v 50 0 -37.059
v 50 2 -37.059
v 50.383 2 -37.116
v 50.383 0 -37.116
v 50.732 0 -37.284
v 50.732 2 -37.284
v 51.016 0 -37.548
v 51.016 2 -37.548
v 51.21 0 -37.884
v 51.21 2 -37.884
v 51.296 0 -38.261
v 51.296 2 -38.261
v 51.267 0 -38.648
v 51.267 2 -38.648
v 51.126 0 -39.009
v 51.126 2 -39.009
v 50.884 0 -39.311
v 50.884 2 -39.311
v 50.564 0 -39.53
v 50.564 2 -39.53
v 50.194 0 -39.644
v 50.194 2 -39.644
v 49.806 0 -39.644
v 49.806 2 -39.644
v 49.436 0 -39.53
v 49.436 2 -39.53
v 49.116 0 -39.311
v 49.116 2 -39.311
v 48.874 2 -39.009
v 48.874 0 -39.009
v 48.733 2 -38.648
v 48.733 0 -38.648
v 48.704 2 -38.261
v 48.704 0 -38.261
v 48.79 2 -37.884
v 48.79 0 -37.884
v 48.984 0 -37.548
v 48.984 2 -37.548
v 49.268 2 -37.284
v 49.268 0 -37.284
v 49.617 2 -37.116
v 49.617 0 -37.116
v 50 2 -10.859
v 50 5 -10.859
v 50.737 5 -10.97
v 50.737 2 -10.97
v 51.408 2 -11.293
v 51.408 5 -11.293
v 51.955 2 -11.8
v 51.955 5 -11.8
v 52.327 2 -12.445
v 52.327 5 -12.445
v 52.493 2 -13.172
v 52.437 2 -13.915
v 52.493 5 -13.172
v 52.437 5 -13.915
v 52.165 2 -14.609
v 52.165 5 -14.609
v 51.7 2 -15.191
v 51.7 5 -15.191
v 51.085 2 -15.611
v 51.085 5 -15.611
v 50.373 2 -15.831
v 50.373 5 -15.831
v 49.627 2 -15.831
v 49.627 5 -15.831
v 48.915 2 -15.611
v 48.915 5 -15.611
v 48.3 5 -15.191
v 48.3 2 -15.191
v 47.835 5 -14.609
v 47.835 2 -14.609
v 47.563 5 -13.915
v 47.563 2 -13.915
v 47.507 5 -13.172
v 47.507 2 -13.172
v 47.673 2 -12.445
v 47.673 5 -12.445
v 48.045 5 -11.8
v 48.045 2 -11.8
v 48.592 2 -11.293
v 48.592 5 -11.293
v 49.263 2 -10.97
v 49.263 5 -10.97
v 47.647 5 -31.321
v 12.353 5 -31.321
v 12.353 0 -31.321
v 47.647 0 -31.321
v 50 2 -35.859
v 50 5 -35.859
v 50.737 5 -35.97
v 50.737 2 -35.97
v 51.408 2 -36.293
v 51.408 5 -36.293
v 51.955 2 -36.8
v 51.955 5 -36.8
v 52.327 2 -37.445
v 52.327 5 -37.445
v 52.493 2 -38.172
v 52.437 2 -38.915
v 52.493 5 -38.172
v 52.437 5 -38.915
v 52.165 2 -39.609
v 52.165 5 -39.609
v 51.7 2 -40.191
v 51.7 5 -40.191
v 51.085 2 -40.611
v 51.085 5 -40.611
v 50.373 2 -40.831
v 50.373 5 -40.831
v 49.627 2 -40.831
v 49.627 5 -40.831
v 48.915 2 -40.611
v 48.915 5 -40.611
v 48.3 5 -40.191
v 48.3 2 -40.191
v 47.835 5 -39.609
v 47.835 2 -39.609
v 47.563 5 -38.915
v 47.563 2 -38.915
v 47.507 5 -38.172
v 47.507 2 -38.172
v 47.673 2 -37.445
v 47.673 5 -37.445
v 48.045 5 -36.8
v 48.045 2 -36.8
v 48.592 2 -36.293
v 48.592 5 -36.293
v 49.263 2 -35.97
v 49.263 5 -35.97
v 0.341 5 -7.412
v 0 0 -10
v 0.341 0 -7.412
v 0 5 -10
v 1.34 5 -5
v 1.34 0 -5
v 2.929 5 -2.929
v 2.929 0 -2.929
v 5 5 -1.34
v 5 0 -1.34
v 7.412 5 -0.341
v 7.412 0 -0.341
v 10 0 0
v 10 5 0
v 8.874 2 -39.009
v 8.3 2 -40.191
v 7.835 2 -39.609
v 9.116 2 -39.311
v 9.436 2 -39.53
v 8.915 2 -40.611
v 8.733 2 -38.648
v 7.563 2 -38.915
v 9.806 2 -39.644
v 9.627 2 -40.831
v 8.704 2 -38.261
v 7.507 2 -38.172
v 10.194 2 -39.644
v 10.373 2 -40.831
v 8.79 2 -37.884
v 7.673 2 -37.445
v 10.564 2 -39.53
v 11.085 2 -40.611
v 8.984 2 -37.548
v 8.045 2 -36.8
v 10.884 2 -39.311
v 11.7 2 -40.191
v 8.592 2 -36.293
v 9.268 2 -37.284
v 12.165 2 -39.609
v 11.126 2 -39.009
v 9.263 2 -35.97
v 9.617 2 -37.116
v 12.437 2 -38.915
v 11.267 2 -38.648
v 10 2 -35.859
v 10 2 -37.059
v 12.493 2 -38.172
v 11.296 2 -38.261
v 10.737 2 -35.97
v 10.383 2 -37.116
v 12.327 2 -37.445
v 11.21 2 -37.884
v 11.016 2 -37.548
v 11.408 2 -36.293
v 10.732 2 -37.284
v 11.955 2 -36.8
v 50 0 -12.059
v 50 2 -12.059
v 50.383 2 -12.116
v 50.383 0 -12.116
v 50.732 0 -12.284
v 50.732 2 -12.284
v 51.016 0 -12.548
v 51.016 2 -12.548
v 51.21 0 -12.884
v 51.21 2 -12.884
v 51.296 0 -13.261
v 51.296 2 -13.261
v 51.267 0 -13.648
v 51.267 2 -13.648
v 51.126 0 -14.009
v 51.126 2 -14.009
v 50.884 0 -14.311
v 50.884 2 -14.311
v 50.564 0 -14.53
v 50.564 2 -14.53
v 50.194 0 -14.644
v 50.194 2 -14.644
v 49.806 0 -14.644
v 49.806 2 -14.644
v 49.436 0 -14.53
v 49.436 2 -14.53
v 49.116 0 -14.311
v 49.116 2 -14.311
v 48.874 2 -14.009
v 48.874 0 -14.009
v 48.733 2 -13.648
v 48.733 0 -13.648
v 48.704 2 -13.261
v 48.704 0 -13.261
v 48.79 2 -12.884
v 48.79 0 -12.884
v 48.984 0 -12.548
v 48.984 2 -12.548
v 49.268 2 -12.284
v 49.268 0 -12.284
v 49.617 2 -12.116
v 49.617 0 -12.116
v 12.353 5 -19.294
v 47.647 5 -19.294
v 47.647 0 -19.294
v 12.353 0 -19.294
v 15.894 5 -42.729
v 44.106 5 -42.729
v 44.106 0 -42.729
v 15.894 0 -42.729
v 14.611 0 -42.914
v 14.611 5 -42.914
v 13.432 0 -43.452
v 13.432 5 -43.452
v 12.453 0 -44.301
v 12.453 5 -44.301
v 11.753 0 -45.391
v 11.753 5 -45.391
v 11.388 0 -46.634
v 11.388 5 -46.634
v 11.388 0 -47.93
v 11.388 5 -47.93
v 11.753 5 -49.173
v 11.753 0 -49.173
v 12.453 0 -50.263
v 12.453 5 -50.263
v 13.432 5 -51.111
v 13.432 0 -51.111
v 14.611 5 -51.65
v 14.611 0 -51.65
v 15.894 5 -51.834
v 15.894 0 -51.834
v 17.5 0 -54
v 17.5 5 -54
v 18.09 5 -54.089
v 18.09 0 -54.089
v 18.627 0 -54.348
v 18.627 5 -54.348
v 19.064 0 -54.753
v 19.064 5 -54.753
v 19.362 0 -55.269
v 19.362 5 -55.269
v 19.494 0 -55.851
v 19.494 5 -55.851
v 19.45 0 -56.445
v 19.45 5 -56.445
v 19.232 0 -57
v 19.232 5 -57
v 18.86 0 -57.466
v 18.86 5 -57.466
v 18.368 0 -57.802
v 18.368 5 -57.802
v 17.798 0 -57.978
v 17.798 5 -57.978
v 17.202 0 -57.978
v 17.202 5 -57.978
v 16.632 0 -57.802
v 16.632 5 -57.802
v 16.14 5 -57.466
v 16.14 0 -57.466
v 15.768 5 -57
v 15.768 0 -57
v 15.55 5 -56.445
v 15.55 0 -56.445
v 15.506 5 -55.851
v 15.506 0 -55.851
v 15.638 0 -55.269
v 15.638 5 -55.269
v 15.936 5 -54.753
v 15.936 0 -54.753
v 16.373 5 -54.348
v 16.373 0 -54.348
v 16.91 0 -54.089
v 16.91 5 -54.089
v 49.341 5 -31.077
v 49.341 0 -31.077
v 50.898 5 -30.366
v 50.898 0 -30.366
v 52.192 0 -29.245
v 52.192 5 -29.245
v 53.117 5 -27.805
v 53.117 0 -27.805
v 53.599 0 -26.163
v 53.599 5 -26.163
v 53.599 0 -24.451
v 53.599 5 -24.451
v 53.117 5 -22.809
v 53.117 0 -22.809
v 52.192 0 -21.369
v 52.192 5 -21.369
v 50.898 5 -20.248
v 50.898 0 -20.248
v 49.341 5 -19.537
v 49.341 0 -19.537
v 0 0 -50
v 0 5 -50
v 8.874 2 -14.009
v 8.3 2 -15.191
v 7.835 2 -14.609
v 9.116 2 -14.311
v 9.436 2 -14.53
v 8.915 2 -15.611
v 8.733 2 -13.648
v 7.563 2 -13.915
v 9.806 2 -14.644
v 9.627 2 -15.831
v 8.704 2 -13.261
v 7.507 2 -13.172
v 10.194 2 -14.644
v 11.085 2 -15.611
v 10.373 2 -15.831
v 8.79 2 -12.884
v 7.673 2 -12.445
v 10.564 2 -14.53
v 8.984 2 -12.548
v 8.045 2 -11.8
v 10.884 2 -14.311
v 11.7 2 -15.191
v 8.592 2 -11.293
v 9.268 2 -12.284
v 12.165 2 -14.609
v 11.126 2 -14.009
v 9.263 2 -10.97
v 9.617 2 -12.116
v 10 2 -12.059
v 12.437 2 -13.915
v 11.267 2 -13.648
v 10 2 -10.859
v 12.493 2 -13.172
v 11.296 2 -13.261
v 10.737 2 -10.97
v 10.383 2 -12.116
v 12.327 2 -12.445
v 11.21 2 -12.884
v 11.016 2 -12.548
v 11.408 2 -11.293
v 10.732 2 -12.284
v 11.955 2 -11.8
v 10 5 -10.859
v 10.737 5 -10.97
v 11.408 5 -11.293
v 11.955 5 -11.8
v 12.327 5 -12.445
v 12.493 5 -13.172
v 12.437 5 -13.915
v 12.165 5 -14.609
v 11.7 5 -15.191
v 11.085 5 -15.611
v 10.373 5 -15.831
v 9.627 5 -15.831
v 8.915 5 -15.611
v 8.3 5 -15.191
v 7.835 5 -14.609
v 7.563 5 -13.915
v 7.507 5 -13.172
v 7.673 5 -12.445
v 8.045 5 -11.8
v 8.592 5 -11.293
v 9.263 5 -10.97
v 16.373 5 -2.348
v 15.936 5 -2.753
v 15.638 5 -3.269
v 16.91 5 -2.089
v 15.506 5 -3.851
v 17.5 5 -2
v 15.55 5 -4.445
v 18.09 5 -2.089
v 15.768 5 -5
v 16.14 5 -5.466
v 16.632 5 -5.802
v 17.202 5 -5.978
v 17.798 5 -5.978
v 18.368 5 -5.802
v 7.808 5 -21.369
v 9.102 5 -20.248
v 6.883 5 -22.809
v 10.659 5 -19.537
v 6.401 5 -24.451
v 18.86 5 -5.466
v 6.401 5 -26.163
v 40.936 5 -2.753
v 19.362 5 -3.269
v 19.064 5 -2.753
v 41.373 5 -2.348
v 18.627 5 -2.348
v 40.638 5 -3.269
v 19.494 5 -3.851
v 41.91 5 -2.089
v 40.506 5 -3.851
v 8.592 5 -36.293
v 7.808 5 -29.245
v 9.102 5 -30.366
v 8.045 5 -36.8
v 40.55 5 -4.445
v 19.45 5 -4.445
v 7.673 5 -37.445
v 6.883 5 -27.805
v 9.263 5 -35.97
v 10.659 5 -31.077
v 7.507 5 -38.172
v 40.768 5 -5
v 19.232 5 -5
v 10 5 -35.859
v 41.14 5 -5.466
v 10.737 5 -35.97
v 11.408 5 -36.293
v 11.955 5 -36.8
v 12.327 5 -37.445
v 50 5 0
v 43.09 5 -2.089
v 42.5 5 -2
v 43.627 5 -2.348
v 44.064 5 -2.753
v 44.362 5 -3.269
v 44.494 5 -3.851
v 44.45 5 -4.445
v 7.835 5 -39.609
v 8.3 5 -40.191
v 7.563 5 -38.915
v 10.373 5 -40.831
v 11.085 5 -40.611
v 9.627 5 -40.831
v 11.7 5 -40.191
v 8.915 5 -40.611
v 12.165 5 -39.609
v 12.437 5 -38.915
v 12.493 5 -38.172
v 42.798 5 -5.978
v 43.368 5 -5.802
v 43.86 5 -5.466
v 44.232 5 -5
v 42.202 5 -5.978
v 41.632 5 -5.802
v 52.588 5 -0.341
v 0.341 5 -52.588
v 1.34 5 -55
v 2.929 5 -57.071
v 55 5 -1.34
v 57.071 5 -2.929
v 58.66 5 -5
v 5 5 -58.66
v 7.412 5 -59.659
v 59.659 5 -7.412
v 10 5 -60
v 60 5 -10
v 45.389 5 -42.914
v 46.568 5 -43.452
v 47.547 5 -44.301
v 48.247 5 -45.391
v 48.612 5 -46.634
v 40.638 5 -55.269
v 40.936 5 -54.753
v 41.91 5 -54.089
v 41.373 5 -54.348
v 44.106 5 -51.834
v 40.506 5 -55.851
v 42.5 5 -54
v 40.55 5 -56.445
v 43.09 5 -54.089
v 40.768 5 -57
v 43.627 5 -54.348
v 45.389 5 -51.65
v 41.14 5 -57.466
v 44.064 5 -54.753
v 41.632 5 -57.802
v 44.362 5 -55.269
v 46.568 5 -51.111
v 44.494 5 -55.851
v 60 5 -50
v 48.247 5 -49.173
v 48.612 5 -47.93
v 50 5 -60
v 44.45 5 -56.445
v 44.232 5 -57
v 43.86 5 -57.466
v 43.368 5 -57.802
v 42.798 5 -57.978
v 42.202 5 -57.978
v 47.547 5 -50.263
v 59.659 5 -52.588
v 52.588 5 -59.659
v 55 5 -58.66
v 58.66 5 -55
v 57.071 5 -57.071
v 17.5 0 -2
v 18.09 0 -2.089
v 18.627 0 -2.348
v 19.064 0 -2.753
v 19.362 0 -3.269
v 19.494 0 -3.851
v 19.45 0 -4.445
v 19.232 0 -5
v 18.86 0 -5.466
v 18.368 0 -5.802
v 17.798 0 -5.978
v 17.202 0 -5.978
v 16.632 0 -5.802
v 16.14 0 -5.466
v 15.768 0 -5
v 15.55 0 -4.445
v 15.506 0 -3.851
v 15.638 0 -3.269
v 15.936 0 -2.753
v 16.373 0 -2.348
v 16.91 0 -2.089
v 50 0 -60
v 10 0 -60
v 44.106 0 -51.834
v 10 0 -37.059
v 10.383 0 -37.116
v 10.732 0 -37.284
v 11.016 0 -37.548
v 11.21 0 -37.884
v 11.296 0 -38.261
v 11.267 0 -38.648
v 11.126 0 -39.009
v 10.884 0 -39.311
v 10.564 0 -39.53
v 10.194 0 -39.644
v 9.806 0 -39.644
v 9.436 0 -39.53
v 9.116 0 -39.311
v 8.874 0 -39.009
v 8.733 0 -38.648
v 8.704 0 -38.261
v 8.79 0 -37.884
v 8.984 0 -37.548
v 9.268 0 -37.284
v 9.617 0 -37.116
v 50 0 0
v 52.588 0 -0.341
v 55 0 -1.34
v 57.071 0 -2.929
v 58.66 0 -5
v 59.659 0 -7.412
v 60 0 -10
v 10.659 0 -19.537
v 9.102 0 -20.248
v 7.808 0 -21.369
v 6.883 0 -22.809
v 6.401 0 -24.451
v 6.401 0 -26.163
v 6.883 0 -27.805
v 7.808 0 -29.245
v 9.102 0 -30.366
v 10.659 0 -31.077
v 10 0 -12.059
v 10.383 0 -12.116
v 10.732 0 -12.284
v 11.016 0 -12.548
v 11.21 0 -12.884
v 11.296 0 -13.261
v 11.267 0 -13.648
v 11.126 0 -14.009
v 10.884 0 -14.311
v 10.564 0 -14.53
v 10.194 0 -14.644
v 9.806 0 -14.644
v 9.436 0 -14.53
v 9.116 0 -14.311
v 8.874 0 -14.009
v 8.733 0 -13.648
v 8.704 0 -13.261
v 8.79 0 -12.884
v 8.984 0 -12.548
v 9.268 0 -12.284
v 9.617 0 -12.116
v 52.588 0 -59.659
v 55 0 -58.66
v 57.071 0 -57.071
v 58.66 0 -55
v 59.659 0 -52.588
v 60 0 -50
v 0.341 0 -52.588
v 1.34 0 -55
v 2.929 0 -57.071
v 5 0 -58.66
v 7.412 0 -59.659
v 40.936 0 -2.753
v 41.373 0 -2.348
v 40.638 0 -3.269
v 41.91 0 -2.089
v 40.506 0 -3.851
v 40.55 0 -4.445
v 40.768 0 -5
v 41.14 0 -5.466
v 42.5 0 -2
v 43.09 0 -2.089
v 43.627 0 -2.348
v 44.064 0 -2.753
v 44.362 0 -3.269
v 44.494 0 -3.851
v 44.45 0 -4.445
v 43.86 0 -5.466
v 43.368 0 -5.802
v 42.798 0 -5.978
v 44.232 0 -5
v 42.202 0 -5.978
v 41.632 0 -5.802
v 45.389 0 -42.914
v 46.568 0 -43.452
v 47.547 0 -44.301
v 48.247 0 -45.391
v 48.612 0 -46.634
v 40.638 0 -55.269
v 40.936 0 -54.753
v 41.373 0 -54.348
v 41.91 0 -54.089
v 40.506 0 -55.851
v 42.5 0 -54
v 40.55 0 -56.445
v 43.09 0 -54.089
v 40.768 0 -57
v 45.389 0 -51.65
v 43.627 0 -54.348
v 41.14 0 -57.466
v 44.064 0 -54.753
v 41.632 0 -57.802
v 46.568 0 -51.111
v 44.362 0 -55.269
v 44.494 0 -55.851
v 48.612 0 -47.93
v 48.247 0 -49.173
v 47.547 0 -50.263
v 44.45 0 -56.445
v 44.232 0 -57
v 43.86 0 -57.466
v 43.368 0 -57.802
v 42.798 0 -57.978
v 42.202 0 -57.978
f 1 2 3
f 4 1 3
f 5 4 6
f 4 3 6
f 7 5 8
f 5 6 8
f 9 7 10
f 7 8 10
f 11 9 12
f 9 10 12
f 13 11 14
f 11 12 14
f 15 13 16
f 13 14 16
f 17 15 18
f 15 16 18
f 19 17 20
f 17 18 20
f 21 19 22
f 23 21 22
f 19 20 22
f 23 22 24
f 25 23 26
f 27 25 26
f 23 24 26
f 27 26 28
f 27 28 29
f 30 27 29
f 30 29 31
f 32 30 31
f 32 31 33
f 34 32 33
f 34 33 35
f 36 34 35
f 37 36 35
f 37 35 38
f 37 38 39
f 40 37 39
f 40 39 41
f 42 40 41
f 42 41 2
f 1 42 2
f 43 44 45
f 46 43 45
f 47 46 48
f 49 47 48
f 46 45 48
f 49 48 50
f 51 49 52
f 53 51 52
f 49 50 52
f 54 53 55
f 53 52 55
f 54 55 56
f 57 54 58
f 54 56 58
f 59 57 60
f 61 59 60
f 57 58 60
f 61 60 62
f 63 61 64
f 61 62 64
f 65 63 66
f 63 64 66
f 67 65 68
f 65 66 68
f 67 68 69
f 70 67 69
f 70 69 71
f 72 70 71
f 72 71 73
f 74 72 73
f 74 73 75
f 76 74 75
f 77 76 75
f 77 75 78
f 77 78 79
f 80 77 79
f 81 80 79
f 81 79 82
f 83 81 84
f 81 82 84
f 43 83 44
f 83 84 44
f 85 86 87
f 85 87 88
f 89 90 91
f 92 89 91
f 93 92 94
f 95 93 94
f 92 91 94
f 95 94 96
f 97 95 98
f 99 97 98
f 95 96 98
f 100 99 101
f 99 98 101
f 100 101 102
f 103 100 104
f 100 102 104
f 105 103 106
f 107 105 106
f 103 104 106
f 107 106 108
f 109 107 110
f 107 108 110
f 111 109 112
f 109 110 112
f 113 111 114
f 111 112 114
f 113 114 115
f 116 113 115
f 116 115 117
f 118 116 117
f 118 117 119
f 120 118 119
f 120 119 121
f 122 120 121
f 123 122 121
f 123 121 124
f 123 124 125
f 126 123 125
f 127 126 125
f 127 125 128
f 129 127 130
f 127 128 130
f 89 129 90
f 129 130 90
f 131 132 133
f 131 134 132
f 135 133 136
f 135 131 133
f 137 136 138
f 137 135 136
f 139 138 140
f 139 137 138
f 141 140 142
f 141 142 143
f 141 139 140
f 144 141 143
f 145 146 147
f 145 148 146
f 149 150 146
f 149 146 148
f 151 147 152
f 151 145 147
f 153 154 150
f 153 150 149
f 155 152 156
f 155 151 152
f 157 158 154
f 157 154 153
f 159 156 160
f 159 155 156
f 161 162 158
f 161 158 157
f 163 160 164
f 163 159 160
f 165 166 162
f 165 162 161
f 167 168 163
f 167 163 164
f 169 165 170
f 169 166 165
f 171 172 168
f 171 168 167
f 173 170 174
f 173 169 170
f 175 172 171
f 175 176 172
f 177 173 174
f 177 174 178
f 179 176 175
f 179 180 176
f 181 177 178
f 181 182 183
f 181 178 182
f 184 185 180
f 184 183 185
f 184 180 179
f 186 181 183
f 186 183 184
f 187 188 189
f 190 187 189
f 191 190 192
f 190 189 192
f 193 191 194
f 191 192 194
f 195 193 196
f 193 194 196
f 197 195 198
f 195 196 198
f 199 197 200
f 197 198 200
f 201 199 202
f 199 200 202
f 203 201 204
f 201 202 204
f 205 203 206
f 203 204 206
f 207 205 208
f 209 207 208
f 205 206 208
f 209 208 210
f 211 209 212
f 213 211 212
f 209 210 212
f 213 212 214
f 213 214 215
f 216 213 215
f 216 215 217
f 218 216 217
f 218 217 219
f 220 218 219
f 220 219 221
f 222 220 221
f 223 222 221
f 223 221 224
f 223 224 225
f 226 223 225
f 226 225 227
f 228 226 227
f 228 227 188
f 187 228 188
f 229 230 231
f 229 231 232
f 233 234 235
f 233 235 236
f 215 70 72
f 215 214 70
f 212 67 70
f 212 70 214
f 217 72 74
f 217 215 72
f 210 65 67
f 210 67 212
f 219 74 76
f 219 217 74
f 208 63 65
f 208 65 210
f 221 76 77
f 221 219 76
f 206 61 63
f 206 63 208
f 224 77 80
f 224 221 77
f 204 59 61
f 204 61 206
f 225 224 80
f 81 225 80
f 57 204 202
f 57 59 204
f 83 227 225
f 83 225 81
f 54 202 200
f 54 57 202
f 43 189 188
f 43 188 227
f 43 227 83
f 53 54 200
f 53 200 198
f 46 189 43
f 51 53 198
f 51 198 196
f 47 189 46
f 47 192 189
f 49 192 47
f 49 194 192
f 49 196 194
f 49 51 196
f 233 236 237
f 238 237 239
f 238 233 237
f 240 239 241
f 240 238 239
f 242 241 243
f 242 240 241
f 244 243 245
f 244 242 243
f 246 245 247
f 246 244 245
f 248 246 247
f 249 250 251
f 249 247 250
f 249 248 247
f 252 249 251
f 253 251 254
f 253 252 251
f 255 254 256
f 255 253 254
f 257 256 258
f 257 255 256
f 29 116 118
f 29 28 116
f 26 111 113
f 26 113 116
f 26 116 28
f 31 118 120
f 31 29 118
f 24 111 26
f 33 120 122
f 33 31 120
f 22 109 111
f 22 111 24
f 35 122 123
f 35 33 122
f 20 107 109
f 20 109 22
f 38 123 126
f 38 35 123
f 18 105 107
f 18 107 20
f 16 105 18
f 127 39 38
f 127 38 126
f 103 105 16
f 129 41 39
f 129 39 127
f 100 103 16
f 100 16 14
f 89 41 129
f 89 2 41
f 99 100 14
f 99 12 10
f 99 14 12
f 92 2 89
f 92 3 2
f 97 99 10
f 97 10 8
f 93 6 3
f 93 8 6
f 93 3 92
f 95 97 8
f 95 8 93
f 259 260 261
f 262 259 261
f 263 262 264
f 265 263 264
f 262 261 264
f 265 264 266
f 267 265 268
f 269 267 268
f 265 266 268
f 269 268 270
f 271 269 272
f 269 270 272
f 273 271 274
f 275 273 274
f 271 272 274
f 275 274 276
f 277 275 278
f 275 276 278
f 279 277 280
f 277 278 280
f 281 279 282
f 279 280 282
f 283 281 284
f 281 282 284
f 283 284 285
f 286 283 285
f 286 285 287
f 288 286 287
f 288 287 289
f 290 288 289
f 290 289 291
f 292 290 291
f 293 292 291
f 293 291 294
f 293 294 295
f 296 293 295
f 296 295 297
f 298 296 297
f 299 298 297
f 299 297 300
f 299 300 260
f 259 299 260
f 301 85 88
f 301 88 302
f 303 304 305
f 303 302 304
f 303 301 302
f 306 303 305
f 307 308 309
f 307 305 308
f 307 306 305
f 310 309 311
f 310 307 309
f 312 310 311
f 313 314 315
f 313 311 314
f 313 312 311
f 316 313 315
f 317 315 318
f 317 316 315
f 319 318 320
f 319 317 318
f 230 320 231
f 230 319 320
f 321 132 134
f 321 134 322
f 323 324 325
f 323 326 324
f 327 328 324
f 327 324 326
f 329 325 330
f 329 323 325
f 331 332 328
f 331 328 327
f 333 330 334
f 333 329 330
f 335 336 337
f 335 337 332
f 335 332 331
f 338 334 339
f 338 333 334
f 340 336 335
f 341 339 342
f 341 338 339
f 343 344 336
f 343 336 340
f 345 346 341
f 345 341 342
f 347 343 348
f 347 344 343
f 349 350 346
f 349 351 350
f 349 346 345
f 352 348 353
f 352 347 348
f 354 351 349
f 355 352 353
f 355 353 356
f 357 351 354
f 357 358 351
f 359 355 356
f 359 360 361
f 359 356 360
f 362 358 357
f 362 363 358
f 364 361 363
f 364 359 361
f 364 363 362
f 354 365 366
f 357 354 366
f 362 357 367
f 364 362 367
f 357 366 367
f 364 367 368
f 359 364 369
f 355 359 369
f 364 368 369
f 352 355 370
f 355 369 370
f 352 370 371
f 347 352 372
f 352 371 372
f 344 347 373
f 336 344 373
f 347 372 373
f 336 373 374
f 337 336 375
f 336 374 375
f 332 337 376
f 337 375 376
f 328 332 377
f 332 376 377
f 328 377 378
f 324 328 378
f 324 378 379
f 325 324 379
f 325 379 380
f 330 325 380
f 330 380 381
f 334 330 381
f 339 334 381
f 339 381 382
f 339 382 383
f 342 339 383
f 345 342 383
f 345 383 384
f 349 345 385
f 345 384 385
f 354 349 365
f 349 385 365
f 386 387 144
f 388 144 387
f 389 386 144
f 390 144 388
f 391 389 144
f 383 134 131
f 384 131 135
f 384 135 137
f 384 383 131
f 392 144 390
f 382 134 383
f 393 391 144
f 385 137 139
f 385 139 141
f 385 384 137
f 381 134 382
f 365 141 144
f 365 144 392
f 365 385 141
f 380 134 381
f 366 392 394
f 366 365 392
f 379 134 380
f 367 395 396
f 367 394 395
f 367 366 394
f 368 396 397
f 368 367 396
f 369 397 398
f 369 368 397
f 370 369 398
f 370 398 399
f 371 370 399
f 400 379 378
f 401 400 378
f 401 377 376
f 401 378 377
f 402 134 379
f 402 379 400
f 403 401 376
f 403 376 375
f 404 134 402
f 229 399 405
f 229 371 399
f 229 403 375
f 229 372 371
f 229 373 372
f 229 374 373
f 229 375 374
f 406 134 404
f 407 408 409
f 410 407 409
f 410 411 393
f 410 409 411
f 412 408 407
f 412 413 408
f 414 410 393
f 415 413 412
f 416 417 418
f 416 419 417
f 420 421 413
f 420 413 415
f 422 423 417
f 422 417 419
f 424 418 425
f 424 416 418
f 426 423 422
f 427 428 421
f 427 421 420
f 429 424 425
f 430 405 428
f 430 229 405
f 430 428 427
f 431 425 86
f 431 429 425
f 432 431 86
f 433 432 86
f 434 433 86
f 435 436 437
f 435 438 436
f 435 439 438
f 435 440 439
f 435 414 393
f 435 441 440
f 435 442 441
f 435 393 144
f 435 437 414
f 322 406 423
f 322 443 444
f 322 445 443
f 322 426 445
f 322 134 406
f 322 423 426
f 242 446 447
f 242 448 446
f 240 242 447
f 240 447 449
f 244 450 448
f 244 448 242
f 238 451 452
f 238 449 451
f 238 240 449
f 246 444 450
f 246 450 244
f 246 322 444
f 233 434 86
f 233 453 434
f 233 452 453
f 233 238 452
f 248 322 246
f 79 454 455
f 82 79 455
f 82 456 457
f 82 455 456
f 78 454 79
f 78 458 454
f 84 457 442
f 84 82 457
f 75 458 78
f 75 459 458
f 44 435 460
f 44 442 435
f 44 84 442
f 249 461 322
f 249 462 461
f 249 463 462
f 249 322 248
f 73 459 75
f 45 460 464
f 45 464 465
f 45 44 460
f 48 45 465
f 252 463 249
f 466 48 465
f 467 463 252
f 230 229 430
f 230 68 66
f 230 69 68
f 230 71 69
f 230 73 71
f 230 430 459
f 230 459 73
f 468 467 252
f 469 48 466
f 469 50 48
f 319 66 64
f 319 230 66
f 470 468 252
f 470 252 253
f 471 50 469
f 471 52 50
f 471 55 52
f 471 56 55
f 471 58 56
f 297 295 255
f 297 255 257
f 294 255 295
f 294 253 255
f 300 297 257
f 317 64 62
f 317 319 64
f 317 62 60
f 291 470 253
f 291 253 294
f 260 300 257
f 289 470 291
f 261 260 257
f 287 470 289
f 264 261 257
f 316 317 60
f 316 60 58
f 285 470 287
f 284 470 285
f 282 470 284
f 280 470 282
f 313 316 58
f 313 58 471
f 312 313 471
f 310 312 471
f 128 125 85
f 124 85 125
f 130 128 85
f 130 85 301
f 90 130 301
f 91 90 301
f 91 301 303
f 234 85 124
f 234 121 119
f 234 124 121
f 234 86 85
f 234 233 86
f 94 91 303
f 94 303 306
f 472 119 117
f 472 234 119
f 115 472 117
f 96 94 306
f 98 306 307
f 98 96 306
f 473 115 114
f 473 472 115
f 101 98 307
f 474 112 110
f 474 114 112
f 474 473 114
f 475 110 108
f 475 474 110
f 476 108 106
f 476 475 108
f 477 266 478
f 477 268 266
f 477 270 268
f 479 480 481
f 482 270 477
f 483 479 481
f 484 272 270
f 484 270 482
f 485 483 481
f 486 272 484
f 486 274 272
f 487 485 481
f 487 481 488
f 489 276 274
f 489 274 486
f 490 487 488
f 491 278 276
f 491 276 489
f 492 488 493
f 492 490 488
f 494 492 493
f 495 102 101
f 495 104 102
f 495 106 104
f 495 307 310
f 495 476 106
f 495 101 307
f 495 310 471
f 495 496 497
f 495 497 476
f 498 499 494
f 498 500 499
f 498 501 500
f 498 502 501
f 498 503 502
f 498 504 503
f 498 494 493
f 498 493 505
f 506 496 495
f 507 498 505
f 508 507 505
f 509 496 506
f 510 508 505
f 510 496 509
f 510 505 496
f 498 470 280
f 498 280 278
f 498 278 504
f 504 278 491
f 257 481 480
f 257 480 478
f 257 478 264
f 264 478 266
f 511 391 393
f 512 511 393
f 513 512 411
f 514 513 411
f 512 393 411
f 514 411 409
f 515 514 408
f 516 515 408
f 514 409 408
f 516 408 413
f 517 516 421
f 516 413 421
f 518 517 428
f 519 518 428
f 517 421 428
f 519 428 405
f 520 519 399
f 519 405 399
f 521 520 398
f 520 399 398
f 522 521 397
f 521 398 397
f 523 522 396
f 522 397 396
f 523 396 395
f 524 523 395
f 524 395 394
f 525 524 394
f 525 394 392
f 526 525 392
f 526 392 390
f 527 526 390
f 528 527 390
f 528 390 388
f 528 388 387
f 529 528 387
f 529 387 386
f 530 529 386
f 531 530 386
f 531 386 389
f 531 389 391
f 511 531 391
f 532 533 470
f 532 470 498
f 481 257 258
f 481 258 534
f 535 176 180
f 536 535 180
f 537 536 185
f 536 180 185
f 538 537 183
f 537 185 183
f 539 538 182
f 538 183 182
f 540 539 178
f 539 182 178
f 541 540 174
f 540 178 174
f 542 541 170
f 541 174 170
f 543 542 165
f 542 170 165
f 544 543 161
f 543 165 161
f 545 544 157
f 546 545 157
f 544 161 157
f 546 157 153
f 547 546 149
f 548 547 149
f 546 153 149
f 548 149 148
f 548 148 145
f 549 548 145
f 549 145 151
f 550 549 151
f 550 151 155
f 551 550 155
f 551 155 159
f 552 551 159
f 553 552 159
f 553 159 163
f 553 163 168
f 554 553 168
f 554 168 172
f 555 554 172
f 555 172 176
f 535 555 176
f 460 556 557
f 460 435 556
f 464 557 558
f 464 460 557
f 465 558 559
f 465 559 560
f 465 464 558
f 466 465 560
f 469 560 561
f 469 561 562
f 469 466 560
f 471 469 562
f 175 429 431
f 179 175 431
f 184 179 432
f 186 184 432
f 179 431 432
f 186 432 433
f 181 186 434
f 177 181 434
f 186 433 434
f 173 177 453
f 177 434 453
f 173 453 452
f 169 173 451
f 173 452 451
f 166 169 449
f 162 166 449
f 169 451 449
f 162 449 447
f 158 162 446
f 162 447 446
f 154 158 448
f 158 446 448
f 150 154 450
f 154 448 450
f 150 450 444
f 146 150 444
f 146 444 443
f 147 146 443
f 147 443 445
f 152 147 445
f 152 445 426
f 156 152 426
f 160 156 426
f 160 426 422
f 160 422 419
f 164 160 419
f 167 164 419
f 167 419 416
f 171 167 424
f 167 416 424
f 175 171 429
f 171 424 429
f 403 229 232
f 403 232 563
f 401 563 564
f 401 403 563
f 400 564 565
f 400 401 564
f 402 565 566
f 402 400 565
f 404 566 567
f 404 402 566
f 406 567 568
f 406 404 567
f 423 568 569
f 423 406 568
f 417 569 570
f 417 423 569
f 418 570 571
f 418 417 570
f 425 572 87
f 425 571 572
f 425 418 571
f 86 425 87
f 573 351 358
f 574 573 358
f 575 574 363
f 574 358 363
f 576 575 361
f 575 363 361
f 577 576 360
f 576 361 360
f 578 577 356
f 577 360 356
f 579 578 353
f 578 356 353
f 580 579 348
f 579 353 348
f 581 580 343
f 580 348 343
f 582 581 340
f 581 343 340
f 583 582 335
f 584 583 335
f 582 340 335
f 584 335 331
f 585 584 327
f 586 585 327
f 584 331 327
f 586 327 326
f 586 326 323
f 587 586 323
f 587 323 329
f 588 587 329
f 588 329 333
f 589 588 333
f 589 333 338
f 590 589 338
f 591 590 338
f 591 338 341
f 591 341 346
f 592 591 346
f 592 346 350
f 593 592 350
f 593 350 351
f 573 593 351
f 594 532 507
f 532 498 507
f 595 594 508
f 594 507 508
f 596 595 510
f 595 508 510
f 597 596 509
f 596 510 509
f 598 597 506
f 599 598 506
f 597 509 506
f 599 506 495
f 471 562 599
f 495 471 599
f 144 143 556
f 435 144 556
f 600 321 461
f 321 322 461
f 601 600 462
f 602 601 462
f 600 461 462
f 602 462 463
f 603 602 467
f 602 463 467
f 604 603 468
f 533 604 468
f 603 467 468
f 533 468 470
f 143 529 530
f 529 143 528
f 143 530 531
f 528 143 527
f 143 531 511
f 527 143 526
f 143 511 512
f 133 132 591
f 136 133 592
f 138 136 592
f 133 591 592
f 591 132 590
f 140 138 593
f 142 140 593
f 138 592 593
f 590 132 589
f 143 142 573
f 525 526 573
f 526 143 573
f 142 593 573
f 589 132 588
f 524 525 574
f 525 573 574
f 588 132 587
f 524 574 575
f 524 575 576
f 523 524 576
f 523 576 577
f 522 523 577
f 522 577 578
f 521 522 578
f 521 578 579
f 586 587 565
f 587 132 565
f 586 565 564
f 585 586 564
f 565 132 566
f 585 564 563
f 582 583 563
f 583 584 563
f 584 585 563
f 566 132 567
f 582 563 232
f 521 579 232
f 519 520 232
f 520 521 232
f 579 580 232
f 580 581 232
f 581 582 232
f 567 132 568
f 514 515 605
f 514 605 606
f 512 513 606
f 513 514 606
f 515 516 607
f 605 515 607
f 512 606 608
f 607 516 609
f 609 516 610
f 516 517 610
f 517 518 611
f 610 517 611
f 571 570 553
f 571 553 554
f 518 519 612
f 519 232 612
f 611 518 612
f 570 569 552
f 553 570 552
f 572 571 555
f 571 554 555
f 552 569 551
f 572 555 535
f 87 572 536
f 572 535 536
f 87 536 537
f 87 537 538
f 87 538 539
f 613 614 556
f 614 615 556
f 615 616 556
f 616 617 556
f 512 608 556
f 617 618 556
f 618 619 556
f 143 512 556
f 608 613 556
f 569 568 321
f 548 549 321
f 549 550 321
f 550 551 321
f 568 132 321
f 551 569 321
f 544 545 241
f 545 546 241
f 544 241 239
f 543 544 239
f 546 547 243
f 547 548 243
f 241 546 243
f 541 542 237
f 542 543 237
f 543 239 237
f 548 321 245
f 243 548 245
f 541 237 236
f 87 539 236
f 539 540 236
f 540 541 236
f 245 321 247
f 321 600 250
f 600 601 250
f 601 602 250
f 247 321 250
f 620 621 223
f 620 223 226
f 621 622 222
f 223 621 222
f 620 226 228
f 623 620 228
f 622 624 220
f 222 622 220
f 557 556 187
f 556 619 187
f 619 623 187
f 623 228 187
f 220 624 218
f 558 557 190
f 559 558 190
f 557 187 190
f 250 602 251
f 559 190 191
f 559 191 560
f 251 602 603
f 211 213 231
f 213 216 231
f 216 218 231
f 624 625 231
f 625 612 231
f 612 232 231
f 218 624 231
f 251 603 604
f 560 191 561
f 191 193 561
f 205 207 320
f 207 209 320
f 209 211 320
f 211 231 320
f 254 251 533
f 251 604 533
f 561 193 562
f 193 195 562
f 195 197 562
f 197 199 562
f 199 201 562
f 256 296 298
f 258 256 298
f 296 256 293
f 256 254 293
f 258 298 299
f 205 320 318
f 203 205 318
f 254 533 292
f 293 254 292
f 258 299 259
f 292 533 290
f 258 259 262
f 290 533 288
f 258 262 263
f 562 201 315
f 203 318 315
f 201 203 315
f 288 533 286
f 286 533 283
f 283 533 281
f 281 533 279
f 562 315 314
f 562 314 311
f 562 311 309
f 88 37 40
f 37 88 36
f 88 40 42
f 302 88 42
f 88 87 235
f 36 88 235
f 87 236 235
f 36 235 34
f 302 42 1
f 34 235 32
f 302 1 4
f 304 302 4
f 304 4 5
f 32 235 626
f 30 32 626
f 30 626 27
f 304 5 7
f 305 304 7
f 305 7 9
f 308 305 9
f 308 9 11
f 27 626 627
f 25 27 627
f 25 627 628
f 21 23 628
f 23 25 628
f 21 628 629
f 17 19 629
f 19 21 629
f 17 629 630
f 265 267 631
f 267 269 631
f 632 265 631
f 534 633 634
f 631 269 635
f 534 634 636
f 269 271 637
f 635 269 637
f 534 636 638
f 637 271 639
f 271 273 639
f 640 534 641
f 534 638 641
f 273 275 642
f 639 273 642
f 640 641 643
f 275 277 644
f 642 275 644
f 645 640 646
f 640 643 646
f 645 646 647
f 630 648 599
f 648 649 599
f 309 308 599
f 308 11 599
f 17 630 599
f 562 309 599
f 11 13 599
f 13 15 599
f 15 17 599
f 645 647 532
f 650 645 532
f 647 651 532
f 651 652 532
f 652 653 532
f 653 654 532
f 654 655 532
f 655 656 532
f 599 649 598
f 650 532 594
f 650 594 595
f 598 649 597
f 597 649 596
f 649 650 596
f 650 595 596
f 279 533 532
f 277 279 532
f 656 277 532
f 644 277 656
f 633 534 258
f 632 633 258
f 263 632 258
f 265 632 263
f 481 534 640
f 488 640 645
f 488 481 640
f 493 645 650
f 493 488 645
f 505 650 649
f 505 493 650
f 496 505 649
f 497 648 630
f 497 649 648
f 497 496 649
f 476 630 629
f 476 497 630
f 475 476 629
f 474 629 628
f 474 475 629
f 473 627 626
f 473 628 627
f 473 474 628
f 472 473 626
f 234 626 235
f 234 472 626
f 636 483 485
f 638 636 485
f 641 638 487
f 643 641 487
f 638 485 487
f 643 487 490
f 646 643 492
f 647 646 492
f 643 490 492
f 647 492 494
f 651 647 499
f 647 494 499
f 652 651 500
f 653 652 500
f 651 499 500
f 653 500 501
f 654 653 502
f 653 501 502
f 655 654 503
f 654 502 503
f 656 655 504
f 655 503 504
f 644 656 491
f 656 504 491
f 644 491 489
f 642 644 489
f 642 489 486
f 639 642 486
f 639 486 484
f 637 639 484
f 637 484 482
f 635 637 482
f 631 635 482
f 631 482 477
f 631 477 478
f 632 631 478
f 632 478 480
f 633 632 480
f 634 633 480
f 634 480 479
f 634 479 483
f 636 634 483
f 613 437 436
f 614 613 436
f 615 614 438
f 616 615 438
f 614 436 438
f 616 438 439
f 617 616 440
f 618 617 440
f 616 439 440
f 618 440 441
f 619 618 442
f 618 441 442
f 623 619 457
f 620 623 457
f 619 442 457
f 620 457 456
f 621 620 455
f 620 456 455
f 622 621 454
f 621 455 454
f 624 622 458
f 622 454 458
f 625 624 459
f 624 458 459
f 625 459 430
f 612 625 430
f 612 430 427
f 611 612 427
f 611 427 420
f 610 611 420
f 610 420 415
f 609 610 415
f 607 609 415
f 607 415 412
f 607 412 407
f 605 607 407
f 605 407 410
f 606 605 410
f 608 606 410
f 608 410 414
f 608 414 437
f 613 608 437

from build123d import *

# Parameters (mm, degrees)
ESQUISSE1_W             = 60
ESQUISSE1_H             = 60
BOSS_EXTRU_1_DEPTH      = 5
ESQUISSE2_R             = 2
ESQUISSE2_R_2           = 1.3
ENL_V_MAT_EXTRU_1_DEPTH = 86
ESQUISSE4_R             = 2.5
ENL_V_MAT_EXTRU_2_DEPTH = 3
CONG_1_R                = 10
ENL_V_MAT_EXTRU_4_DEPTH = 86


with BuildPart() as part:
    # Esquisse1 → Boss.-Extru.1 (new body)
    with BuildSketch(Plane(origin=(0, 0, 0), x_dir=(1, 0, 0), z_dir=(0, 1, 0))):
        with Locations((30, 30)):
            Rectangle(ESQUISSE1_W, ESQUISSE1_H)
    extrude(amount=BOSS_EXTRU_1_DEPTH)

    # Esquisse2 → Enlèv. mat.-Extru.1 (cut, through all)
    with BuildSketch(Plane(origin=(0, 5, 0), x_dir=(1, 0, 0), z_dir=(0, 1, 0))):
        with Locations(Location((17.5, 56, 0), (0, 0, 270))):
            Circle(ESQUISSE2_R)
        with Locations(Location((17.5, 4, 0), (0, 0, 270))):
            Circle(ESQUISSE2_R)
        with Locations(Location((42.5, 4, 0), (0, 0, 270))):
            Circle(ESQUISSE2_R)
        with Locations(Location((42.5, 56, 0), (0, 0, 270))):
            Circle(ESQUISSE2_R)
        with Locations(Location((10, 38.358507613, 0), (0, 0, 270))):
            Circle(ESQUISSE2_R_2)
        with Locations(Location((10, 13.358507613, 0), (0, 0, 270))):
            Circle(ESQUISSE2_R_2)
        with Locations(Location((50, 13.358507613, 0), (0, 0, 270))):
            Circle(ESQUISSE2_R_2)
        with Locations(Location((50, 38.358507613, 0), (0, 0, 270))):
            Circle(ESQUISSE2_R_2)
    extrude(amount=-ENL_V_MAT_EXTRU_1_DEPTH, mode=Mode.SUBTRACT)

    # Esquisse4 → Enlèv. mat.-Extru.2 (cut)
    with BuildSketch(Plane(origin=(0, 5, 0), x_dir=(1, 0, 0), z_dir=(0, 1, 0))):
        with Locations(Location((10, 38.358507613, 0), (0, 0, 270))):
            Circle(ESQUISSE4_R)
        with Locations(Location((10, 13.358507613, 0), (0, 0, 270))):
            Circle(ESQUISSE4_R)
        with Locations(Location((50, 13.358507613, 0), (0, 0, 270))):
            Circle(ESQUISSE4_R)
        with Locations(Location((50, 38.358507613, 0), (0, 0, 270))):
            Circle(ESQUISSE4_R)
    extrude(amount=-ENL_V_MAT_EXTRU_2_DEPTH, mode=Mode.SUBTRACT)

    # Congé1
    cong_1_edges = [part.edges().sort_by_distance(p)[0] for p in [
        (0, 2.5, -60),
        (60, 2.5, -60),
        (60, 2.5, 0),
        (0, 2.5, 0),
    ]]
    fillet(cong_1_edges, radius=CONG_1_R)

    # Esquisse6 → Enlèv. mat.-Extru.4 (cut, through all)
    with BuildSketch(Plane(origin=(0, 5, 0), x_dir=(1, 0, 0), z_dir=(0, 1, 0))):
        with BuildLine():
            Line((15.893584332, 51.834033813), (44.106415668, 51.834033813))
            ThreePointArc((44.106415668, 51.834033813), (48.658685267, 47.281764215), (44.106415668, 42.729494617))
            Line((44.106415668, 42.729494617), (15.893584332, 42.729494617))
            ThreePointArc((15.893584332, 42.729494617), (11.341314733, 47.281764215), (15.893584332, 51.834033813))
        make_face()
        with BuildLine():
            Line((12.3529302, 31.320720192), (47.6470698, 31.320720192))
            ThreePointArc((47.6470698, 31.320720192), (53.660561739, 25.307228254), (47.6470698, 19.293736315))
            Line((47.6470698, 19.293736315), (12.3529302, 19.293736315))
            ThreePointArc((12.3529302, 19.293736315), (6.339438261, 25.307228254), (12.3529302, 31.320720192))
        make_face()
    extrude(amount=-ENL_V_MAT_EXTRU_4_DEPTH, mode=Mode.SUBTRACT)


solid = part.part
